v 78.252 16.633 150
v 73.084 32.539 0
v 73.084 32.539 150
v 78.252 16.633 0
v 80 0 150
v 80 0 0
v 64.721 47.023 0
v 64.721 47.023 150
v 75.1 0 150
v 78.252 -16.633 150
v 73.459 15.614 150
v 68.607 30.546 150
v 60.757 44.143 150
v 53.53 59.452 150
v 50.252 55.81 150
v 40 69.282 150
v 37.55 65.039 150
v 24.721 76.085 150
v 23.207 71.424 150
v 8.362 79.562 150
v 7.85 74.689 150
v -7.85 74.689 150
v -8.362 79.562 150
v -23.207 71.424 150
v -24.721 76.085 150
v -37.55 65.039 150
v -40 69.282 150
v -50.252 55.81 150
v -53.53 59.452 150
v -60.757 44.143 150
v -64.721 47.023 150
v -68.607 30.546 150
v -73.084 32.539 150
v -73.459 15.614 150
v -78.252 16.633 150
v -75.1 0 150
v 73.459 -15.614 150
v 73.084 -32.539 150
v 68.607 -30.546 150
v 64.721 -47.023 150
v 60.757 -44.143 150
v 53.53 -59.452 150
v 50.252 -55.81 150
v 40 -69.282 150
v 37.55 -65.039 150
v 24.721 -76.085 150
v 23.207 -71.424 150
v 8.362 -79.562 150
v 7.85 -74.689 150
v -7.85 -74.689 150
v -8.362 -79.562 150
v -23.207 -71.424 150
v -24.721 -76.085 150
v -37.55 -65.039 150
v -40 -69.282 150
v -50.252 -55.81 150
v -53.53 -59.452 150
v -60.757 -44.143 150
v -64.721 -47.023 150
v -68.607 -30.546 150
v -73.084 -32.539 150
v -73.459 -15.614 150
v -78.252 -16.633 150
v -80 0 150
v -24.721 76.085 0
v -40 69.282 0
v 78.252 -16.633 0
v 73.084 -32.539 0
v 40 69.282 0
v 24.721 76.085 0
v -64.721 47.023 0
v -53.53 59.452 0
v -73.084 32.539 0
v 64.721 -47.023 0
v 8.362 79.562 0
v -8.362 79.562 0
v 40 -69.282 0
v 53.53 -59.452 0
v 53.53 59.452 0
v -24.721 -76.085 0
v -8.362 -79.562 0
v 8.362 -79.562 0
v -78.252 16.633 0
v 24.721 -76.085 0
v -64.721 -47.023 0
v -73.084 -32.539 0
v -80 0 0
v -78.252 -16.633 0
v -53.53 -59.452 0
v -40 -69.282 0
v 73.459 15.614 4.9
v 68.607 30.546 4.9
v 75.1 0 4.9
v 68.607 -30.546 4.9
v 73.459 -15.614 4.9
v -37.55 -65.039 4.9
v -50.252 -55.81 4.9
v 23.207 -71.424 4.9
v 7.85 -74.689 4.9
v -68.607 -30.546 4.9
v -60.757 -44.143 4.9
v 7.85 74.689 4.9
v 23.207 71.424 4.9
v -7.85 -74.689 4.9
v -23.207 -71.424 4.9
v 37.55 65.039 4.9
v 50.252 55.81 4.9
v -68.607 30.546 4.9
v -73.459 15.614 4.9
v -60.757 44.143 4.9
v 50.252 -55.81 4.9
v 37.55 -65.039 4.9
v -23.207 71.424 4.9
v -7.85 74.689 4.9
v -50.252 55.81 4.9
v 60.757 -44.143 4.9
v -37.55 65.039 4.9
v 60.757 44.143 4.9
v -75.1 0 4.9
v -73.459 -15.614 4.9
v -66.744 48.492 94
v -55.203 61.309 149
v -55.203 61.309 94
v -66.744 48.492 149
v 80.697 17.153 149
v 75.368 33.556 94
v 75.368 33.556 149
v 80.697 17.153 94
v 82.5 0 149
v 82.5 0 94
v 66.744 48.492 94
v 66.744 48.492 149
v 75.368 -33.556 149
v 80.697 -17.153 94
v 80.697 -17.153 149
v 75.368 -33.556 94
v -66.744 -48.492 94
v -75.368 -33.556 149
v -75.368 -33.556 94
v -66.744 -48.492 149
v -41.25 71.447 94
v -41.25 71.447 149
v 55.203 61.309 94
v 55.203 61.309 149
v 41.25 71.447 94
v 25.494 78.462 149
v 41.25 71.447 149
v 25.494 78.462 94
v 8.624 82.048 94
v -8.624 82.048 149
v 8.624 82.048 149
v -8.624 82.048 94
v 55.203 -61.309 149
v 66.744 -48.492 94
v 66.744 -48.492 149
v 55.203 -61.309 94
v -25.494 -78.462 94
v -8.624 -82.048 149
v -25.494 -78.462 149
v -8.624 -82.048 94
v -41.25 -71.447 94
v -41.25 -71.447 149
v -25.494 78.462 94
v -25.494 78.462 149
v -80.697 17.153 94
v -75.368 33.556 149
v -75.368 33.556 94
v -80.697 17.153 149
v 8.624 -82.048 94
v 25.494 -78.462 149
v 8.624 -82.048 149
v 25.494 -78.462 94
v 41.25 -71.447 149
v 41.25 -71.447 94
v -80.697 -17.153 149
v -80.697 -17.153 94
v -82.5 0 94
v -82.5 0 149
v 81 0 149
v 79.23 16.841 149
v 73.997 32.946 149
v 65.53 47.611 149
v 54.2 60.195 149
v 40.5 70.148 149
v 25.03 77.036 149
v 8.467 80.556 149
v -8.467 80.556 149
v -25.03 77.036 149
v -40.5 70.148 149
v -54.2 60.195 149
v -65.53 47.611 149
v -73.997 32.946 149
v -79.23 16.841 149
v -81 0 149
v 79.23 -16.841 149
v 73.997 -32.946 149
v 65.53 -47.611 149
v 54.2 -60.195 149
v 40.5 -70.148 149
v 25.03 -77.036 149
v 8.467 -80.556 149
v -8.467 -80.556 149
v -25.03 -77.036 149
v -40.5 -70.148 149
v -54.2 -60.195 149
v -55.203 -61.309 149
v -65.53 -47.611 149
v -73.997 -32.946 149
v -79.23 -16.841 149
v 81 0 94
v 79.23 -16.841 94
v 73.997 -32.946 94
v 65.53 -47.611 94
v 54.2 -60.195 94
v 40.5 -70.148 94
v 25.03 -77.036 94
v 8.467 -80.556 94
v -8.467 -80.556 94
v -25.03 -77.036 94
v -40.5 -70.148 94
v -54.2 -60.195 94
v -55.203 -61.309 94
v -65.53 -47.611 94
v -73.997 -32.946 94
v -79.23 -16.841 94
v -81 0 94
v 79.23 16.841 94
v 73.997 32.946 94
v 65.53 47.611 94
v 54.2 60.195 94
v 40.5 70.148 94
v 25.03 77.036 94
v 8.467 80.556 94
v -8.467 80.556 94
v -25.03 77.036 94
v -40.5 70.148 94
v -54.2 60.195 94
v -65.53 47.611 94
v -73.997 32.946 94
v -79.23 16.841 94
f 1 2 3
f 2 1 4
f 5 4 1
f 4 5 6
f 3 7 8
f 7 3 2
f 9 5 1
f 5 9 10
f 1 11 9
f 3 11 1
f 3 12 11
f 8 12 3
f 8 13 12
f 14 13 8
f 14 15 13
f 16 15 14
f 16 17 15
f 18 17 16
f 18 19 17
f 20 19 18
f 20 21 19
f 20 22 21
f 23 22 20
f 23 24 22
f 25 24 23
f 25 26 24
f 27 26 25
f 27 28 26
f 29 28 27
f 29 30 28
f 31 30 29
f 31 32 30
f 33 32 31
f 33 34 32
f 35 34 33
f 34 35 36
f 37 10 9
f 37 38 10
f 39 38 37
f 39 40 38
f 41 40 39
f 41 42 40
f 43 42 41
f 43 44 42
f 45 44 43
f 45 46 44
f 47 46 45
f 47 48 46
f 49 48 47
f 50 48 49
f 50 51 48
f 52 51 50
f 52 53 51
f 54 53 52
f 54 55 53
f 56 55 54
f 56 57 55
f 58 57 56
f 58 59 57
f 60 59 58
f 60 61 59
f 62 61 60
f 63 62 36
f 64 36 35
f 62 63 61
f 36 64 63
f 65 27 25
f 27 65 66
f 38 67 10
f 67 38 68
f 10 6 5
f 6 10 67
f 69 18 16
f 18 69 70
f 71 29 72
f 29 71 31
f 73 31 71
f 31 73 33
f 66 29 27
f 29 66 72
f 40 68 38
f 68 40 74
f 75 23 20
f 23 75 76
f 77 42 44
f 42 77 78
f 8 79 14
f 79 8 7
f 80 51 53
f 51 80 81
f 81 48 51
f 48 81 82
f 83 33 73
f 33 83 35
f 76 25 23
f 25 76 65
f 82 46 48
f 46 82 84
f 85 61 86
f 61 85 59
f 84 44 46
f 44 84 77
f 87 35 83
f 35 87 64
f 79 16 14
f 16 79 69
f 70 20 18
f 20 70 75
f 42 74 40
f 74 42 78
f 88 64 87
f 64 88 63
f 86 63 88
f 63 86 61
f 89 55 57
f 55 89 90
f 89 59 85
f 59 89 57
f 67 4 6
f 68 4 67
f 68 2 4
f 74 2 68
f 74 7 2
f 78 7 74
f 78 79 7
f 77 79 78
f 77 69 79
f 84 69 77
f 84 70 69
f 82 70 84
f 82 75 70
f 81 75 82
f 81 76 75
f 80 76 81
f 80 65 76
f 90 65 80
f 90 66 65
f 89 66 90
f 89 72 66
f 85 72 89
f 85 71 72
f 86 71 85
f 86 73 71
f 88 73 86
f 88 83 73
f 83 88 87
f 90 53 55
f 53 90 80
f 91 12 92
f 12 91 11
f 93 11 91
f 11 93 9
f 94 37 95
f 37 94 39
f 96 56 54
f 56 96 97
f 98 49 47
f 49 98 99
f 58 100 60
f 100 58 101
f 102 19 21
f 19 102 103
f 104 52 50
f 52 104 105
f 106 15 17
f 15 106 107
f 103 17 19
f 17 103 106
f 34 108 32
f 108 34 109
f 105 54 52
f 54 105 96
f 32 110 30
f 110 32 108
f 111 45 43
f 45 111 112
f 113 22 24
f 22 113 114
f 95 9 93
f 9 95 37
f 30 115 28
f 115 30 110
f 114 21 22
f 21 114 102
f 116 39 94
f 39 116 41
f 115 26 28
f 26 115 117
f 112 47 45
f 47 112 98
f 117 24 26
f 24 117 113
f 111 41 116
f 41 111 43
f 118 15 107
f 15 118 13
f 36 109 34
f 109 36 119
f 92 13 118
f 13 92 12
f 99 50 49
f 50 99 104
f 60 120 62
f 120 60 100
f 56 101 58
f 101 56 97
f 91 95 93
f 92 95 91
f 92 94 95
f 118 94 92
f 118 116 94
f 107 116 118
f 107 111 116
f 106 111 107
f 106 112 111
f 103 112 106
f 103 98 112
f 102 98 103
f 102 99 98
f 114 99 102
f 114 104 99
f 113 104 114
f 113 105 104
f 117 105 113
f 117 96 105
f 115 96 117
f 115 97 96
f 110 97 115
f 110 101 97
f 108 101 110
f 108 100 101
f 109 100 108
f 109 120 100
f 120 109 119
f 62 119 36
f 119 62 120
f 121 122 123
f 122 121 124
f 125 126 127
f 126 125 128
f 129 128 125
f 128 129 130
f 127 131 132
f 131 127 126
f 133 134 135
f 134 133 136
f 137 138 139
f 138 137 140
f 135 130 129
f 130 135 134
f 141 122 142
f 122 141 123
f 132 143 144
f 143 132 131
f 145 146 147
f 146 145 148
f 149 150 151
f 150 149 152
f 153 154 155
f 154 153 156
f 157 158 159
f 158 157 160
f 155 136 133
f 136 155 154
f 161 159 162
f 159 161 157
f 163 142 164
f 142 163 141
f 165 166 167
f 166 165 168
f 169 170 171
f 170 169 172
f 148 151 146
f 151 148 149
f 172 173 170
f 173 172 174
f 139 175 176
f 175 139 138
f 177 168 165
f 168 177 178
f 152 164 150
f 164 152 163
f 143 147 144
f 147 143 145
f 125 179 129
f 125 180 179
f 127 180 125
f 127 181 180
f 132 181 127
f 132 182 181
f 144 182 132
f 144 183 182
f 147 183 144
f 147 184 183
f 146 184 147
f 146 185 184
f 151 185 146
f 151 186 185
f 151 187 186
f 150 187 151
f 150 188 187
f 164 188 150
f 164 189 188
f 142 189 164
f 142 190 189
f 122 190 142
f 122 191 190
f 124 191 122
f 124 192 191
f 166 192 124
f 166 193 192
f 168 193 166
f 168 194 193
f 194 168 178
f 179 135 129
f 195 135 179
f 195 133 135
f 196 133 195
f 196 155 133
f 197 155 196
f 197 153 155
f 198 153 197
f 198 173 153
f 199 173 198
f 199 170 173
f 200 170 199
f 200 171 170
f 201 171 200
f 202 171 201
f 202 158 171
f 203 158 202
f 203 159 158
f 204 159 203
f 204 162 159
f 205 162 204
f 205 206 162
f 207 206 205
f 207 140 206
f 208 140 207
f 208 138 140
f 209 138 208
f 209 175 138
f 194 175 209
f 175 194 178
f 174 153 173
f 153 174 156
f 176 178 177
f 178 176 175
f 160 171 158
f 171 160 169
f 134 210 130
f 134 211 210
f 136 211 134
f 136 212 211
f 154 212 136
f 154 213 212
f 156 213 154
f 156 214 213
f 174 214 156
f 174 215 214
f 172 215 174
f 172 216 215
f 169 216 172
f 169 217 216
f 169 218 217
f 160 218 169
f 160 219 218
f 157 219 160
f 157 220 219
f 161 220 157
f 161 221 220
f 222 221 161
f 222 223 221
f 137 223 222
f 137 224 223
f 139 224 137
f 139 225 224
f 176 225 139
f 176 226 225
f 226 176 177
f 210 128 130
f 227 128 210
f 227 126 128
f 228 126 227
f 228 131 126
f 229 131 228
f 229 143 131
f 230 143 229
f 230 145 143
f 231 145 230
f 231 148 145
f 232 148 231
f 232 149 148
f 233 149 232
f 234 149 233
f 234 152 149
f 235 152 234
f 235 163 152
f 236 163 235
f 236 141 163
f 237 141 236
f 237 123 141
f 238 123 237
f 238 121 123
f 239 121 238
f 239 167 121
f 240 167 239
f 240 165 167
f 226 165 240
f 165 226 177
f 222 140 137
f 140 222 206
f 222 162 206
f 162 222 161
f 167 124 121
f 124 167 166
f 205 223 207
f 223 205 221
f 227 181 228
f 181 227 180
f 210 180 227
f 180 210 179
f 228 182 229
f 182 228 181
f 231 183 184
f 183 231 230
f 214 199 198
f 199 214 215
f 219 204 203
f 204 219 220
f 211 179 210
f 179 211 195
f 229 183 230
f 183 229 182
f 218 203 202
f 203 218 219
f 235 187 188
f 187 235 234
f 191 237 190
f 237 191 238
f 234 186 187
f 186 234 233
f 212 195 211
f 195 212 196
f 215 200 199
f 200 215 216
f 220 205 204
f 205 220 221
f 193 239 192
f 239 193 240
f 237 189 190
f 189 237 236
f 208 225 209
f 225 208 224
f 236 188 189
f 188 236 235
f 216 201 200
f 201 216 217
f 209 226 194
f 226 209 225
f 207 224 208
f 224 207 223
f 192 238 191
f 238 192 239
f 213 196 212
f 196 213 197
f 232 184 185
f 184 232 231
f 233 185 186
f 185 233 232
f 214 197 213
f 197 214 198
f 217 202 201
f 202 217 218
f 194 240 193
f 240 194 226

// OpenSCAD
// Parameters
pipe_standard = 1; //[1:1:1]
nominal_size = 160; //[80:320:1]
length_mm = 150; //[75:300:1]
center = 0; //[0:1:1]
ht160_outer_diameter = 160; //[120:200:1]
ht160_wall_thickness = 4.9; //[2.5:9.8:0.1]
socket_length = 55; //[30:110:1]
socket_wall_extra = 2.5; //[1:6:0.1]
socket_inner_clearance = 1.0; //[0.2:2.5:0.1]
overlap = 1.0; //[0.5:2.0:0.1]

// HT Pipe - complete geometry
module ht_pipe() {
  color([0.85, 0.85, 0.8]) { // PVC color
    // Pipe outer
    difference() {
      cylinder(h=length_mm, r=ht160_outer_diameter/2, center=false);
      // Pipe inner void
      translate([0, 0, ht160_wall_thickness])
        cylinder(h=length_mm, r=ht160_outer_diameter/2 - ht160_wall_thickness, center=false);
    }
    
    // Socket end fitting
    translate([0, 0, length_mm - socket_length - overlap]) {
      difference() {
        cylinder(h=socket_length, r=ht160_outer_diameter/2 + socket_wall_extra, center=false);
        // Socket inner void
        cylinder(h=socket_length, r=ht160_outer_diameter/2 + socket_inner_clearance, center=false);
      }
    }
  }
}

// Assembly
module assembly() {
  ht_pipe();
}

assembly();
